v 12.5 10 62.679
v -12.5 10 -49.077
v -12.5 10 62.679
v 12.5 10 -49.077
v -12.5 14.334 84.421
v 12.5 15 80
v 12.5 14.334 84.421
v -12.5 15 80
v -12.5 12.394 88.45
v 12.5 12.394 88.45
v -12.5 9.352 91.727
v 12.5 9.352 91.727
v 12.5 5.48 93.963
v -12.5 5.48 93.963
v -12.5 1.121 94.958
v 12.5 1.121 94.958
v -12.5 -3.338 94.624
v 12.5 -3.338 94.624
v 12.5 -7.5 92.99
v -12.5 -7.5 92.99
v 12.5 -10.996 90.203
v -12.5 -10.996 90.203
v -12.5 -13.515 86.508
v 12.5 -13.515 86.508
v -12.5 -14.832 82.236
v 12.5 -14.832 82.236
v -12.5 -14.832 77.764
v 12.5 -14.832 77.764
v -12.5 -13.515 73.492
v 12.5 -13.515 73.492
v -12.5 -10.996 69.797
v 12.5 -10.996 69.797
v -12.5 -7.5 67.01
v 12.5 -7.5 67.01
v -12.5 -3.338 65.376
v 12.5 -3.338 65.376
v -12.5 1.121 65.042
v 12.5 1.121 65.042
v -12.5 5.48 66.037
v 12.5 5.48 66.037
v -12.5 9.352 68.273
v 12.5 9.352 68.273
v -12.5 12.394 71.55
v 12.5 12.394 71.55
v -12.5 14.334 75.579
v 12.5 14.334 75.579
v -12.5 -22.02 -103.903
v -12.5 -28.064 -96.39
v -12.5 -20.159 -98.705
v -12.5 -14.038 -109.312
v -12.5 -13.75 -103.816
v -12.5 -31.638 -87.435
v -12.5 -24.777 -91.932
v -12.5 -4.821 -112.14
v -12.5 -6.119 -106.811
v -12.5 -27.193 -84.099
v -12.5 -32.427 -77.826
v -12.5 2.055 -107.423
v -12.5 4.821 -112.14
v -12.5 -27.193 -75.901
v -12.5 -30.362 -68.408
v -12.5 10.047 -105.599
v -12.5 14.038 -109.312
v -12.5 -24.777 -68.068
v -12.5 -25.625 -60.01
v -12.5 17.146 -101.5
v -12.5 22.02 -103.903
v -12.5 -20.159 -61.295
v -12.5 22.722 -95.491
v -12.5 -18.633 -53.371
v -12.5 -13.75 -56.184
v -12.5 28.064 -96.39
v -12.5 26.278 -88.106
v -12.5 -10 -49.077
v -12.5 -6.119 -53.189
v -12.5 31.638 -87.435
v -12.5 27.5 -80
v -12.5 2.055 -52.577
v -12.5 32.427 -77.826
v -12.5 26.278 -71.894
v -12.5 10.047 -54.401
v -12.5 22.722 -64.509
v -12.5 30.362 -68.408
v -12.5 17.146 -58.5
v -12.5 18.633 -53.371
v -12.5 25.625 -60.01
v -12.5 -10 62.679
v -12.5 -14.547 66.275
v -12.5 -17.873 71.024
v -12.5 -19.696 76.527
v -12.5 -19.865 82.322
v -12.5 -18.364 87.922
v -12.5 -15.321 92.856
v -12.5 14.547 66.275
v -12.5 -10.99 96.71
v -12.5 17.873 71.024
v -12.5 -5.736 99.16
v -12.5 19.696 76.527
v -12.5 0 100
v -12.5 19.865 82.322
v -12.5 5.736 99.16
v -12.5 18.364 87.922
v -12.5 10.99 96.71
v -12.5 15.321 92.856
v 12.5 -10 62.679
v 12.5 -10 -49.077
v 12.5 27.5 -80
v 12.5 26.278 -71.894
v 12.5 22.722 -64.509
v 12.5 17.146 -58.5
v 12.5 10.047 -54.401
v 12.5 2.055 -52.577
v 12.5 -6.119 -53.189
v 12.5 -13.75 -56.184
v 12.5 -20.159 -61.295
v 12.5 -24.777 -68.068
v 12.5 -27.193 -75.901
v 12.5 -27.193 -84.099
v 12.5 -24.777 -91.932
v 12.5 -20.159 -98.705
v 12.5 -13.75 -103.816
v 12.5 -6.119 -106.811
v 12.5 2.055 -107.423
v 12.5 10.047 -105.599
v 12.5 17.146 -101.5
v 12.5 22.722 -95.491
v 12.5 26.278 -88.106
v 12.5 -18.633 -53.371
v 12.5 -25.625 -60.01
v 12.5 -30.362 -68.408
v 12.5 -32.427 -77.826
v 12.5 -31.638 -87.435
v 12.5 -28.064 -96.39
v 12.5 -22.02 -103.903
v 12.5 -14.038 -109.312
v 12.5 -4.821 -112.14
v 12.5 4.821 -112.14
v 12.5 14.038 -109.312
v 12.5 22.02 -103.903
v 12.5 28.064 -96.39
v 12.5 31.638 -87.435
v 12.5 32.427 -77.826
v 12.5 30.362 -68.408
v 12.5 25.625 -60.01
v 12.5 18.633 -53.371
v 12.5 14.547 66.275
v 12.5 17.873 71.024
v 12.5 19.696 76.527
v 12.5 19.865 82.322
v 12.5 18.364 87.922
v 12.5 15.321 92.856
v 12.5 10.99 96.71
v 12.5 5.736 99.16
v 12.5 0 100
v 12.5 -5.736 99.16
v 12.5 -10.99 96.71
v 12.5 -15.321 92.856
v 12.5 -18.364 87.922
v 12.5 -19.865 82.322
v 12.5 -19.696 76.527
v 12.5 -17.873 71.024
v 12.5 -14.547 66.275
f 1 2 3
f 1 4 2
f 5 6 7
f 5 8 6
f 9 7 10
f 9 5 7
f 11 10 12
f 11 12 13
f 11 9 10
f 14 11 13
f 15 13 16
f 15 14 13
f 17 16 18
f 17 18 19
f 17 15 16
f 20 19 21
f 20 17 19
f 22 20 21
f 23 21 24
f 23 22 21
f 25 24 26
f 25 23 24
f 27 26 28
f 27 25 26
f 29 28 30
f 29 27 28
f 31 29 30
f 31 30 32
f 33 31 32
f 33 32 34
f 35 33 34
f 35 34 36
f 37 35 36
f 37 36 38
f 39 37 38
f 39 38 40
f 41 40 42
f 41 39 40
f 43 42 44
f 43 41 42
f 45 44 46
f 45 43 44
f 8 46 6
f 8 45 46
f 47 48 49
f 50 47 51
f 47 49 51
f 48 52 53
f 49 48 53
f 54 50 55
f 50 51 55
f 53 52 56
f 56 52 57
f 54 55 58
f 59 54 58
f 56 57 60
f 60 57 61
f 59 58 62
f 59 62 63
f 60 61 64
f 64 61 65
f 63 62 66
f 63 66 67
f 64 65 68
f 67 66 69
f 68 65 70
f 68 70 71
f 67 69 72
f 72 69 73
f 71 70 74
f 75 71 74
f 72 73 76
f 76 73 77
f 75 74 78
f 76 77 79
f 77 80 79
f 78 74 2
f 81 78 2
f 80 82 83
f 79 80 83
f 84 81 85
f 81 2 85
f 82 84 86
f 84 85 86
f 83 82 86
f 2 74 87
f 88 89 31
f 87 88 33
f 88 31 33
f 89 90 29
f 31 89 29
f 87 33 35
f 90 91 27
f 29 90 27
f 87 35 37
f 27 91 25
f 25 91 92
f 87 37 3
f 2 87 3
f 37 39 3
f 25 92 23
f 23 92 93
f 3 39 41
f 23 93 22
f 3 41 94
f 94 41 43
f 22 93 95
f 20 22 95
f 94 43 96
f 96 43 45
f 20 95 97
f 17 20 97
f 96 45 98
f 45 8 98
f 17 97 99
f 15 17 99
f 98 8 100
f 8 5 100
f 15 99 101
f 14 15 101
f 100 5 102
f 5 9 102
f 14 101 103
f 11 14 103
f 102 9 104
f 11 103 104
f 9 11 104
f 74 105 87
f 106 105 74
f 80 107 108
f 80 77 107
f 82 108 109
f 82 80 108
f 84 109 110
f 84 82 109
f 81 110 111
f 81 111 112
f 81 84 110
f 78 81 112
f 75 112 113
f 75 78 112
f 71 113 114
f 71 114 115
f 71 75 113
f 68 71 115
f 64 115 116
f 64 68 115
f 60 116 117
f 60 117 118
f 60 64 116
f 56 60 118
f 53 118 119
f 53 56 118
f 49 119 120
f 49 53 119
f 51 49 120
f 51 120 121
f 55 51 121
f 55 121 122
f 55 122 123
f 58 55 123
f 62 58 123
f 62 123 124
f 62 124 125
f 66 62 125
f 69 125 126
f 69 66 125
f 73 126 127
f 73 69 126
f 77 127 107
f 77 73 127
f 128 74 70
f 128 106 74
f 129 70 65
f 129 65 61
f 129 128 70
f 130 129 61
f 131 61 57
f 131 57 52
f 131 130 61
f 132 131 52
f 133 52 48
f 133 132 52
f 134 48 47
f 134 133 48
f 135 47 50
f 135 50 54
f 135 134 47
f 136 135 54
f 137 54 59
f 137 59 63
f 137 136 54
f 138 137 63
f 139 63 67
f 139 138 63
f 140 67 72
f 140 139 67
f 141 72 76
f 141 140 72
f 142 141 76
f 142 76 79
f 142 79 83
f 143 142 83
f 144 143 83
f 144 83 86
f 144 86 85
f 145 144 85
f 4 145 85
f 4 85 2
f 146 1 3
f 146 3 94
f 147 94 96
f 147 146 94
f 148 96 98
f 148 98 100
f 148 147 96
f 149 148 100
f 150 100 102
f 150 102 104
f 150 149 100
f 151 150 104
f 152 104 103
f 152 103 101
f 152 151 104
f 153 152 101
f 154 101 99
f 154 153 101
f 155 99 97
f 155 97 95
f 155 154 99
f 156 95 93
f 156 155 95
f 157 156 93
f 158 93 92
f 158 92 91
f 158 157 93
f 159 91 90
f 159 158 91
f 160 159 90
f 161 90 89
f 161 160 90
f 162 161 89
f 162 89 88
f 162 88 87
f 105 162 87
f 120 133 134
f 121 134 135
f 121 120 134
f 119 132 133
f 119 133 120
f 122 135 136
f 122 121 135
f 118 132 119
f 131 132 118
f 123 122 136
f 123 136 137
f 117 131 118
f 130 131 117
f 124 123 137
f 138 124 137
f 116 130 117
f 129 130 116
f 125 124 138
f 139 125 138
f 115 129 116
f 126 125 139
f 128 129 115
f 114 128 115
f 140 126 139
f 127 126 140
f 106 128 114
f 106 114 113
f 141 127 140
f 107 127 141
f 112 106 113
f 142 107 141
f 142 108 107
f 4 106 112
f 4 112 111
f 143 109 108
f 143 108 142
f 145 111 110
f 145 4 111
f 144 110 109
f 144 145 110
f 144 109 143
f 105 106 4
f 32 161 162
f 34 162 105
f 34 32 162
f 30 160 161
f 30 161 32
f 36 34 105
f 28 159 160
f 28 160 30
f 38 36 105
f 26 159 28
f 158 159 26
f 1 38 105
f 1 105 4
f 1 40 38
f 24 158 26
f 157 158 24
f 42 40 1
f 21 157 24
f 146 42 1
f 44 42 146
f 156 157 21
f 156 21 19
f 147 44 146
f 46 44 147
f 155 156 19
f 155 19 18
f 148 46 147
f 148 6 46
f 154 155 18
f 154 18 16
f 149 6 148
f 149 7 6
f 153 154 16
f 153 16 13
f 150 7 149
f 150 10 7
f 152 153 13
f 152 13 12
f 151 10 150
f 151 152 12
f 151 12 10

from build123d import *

# Parameters (mm, degrees)
F0_R     = 27.5
F0_R_2   = 15
F1_DEPTH = 12.5


with BuildPart() as f1:
    # F0 (on Right) → F1 (new body, symmetric)
    with BuildSketch(Plane.YZ):
        with BuildLine():
            Line((10, -49.076708), (10, 62.679492))
            ThreePointArc((10, 62.679492), (0, 100), (-10, 62.679492))
            Line((-10, 62.679492), (-10, -49.076708))
            ThreePointArc((-10, -49.076708), (0, -112.5), (10, -49.076708))
        make_face()
        with Locations((0, -80)):
            Circle(F0_R, mode=Mode.SUBTRACT)
        with Locations((0, 80)):
            Circle(F0_R_2, mode=Mode.SUBTRACT)
    extrude(amount=F1_DEPTH, both=True)


solid = f1.part
